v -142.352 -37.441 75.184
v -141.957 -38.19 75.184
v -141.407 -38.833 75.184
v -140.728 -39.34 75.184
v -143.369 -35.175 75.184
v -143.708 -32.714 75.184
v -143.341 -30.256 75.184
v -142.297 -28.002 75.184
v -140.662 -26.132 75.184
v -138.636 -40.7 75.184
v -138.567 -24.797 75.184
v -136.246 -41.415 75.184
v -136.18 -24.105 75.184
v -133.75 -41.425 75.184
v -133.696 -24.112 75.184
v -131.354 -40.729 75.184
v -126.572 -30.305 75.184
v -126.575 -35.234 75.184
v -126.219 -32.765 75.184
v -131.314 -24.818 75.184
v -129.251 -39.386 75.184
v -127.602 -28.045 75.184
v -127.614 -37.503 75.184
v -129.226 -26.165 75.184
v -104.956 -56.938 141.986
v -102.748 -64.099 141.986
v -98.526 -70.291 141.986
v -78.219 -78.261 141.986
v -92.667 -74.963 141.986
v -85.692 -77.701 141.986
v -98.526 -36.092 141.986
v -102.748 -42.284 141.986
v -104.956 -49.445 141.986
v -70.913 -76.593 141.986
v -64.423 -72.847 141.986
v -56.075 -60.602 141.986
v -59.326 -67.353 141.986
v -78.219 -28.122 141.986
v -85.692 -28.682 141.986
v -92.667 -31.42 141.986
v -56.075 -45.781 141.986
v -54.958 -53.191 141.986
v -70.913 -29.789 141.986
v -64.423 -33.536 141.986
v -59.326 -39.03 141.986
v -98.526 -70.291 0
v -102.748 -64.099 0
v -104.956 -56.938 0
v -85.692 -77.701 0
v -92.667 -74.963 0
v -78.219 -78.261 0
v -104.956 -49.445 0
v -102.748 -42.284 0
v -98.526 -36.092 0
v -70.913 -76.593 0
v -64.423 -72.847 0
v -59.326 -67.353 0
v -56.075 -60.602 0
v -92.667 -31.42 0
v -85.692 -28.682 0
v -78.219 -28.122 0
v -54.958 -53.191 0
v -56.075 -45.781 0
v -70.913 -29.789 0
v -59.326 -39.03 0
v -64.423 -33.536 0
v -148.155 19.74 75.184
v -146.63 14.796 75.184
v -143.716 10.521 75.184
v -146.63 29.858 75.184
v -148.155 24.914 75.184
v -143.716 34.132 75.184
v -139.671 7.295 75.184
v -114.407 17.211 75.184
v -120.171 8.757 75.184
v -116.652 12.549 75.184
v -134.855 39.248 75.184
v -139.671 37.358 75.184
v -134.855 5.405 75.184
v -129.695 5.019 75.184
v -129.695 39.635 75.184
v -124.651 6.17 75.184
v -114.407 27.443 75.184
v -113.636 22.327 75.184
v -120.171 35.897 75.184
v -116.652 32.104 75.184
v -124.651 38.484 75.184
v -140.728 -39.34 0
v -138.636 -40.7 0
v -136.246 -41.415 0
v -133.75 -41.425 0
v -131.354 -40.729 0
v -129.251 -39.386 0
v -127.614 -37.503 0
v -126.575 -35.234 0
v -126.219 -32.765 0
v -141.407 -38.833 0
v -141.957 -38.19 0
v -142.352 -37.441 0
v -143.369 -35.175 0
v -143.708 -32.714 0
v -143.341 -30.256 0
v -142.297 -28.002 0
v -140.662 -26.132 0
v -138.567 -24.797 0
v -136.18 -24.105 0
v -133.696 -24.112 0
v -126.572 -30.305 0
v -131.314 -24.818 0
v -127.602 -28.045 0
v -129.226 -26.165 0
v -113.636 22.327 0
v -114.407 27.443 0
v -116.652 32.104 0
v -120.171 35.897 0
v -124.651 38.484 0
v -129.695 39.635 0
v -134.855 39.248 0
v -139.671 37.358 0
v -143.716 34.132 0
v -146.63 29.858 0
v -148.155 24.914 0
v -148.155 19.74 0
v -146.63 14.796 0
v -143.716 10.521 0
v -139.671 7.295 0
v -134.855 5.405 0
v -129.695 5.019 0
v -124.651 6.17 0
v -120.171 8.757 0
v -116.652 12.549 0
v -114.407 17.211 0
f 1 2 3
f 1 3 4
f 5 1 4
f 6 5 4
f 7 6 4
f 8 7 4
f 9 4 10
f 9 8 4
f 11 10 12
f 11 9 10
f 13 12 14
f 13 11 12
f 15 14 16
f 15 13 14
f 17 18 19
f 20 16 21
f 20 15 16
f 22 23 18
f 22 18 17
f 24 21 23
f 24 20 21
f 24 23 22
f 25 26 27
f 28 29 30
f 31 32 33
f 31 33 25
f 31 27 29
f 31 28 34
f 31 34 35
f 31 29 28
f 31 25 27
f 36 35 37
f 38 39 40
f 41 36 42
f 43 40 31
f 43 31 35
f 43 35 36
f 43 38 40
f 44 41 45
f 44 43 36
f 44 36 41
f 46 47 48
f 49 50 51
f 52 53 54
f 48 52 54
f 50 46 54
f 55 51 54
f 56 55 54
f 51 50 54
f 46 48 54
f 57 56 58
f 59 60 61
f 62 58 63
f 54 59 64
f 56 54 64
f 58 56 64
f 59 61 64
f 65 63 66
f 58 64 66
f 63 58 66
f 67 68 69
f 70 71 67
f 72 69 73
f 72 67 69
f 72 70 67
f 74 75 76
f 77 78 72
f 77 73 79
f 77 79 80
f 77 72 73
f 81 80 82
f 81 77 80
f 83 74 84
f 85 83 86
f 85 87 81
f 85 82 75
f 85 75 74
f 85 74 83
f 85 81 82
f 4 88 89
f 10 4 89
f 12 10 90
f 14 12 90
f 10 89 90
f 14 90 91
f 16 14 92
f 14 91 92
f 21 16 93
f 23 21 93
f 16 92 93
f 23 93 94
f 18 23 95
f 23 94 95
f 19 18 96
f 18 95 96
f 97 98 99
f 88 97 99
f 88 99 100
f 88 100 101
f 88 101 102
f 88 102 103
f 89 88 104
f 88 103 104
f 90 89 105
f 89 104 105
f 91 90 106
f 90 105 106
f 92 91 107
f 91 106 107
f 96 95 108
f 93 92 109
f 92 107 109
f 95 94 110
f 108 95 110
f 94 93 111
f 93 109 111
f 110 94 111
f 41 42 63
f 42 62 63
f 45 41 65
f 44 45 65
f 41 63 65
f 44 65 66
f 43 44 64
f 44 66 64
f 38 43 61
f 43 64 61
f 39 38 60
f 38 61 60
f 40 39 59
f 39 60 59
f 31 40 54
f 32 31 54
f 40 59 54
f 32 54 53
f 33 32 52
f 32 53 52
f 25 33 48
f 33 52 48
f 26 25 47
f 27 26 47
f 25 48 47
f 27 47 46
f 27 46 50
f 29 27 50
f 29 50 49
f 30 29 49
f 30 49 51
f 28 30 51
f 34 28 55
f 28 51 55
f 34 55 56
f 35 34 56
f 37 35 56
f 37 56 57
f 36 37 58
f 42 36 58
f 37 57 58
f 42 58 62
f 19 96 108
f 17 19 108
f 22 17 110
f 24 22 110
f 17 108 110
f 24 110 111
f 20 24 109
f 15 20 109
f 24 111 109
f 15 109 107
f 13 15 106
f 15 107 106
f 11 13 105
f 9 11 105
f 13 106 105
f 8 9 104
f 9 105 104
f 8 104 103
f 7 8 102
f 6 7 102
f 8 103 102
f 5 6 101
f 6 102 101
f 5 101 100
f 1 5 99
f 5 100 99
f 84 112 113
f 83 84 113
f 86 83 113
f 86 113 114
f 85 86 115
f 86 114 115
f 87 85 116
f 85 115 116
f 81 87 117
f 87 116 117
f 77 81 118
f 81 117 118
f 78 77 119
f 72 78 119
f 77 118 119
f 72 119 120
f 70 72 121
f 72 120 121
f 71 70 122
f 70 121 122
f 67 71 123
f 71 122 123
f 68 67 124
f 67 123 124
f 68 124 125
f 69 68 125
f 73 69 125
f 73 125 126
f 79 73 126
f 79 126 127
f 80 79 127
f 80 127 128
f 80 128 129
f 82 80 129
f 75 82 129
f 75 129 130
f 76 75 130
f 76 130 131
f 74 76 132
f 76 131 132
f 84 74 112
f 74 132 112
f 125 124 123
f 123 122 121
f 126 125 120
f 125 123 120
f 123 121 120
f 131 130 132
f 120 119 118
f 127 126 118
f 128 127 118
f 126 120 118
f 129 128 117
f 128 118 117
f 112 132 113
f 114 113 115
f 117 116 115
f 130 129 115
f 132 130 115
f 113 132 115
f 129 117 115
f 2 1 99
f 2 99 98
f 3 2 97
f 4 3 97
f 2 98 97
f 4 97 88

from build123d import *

# Parameters (mm, degrees)
F0_R     = 25.1397664288
F1_DEPTH = 75.184
F0_R_2   = 17.3566653616
F2_DEPTH = 66.802


with BuildPart() as f1:
    # F0 (on Top) → F1 (new body)
    with BuildSketch(Plane.XY):
        with Locations((-80.0974220037, -53.1914457679)):
            Circle(F0_R)
    extrude(amount=F1_DEPTH)

    # F2 (add): a face of the model
    f2_faces = [f1.faces().sort_by_distance(p)[0] for p in [
        (-80.0974220037, -53.1914457679, 75.184),
    ]]
    extrude(f2_faces, amount=F2_DEPTH)


with BuildPart() as f1b:
    # F0 (on Top) → F1, piece 2 (new body)
    with BuildSketch(Plane.XY):
        with Locations((-130.9924125671, 22.3267357796)):
            Circle(F0_R_2)
    extrude(amount=F1_DEPTH)


with BuildPart() as f1c:
    # F0 (on Top) → F1, piece 3 (new body)
    with BuildSketch(Plane.XY):
        with BuildLine():
            ThreePointArc((-140.7282212122, -39.3397888884), (-131.3539457938, -40.7293610775), (-126.2188676414, -32.764505595))
            ThreePointArc((-126.2188676414, -32.764505595), (-137.3981445081, -24.3657330714), (-142.3521933282, -37.4413979284))
            ThreePointArc((-142.3521933282, -37.4413979284), (-139.5081938997, -32.2908097934), (-134.9771099305, -36.0439643264))
            ThreePointArc((-134.9771099305, -36.0439643264), (-136.8977114693, -39.3582417936), (-140.7282212122, -39.3397888884))
        make_face()
        with BuildLine():
            ThreePointArc((-134.9771099305, -36.0439643264), (-139.5081938997, -32.2908097934), (-142.3521933282, -37.4413979284))
            ThreePointArc((-142.3521933282, -37.4413979284), (-141.6083506443, -38.4488864269), (-140.7282212122, -39.3397888884))
            ThreePointArc((-140.7282212122, -39.3397888884), (-136.8977114693, -39.3582417936), (-134.9771099305, -36.0439643264))
        make_face()
        with BuildLine():
            ThreePointArc((-140.7282212122, -39.3397888884), (-141.6083506443, -38.4488864269), (-142.3521933282, -37.4413979284))
            ThreePointArc((-142.3521933282, -37.4413979284), (-141.6997870177, -38.5271053628), (-140.7282212122, -39.3397888884))
        make_face()
    extrude(amount=F1_DEPTH)


solid = Compound([f1.part, f1b.part, f1c.part])
